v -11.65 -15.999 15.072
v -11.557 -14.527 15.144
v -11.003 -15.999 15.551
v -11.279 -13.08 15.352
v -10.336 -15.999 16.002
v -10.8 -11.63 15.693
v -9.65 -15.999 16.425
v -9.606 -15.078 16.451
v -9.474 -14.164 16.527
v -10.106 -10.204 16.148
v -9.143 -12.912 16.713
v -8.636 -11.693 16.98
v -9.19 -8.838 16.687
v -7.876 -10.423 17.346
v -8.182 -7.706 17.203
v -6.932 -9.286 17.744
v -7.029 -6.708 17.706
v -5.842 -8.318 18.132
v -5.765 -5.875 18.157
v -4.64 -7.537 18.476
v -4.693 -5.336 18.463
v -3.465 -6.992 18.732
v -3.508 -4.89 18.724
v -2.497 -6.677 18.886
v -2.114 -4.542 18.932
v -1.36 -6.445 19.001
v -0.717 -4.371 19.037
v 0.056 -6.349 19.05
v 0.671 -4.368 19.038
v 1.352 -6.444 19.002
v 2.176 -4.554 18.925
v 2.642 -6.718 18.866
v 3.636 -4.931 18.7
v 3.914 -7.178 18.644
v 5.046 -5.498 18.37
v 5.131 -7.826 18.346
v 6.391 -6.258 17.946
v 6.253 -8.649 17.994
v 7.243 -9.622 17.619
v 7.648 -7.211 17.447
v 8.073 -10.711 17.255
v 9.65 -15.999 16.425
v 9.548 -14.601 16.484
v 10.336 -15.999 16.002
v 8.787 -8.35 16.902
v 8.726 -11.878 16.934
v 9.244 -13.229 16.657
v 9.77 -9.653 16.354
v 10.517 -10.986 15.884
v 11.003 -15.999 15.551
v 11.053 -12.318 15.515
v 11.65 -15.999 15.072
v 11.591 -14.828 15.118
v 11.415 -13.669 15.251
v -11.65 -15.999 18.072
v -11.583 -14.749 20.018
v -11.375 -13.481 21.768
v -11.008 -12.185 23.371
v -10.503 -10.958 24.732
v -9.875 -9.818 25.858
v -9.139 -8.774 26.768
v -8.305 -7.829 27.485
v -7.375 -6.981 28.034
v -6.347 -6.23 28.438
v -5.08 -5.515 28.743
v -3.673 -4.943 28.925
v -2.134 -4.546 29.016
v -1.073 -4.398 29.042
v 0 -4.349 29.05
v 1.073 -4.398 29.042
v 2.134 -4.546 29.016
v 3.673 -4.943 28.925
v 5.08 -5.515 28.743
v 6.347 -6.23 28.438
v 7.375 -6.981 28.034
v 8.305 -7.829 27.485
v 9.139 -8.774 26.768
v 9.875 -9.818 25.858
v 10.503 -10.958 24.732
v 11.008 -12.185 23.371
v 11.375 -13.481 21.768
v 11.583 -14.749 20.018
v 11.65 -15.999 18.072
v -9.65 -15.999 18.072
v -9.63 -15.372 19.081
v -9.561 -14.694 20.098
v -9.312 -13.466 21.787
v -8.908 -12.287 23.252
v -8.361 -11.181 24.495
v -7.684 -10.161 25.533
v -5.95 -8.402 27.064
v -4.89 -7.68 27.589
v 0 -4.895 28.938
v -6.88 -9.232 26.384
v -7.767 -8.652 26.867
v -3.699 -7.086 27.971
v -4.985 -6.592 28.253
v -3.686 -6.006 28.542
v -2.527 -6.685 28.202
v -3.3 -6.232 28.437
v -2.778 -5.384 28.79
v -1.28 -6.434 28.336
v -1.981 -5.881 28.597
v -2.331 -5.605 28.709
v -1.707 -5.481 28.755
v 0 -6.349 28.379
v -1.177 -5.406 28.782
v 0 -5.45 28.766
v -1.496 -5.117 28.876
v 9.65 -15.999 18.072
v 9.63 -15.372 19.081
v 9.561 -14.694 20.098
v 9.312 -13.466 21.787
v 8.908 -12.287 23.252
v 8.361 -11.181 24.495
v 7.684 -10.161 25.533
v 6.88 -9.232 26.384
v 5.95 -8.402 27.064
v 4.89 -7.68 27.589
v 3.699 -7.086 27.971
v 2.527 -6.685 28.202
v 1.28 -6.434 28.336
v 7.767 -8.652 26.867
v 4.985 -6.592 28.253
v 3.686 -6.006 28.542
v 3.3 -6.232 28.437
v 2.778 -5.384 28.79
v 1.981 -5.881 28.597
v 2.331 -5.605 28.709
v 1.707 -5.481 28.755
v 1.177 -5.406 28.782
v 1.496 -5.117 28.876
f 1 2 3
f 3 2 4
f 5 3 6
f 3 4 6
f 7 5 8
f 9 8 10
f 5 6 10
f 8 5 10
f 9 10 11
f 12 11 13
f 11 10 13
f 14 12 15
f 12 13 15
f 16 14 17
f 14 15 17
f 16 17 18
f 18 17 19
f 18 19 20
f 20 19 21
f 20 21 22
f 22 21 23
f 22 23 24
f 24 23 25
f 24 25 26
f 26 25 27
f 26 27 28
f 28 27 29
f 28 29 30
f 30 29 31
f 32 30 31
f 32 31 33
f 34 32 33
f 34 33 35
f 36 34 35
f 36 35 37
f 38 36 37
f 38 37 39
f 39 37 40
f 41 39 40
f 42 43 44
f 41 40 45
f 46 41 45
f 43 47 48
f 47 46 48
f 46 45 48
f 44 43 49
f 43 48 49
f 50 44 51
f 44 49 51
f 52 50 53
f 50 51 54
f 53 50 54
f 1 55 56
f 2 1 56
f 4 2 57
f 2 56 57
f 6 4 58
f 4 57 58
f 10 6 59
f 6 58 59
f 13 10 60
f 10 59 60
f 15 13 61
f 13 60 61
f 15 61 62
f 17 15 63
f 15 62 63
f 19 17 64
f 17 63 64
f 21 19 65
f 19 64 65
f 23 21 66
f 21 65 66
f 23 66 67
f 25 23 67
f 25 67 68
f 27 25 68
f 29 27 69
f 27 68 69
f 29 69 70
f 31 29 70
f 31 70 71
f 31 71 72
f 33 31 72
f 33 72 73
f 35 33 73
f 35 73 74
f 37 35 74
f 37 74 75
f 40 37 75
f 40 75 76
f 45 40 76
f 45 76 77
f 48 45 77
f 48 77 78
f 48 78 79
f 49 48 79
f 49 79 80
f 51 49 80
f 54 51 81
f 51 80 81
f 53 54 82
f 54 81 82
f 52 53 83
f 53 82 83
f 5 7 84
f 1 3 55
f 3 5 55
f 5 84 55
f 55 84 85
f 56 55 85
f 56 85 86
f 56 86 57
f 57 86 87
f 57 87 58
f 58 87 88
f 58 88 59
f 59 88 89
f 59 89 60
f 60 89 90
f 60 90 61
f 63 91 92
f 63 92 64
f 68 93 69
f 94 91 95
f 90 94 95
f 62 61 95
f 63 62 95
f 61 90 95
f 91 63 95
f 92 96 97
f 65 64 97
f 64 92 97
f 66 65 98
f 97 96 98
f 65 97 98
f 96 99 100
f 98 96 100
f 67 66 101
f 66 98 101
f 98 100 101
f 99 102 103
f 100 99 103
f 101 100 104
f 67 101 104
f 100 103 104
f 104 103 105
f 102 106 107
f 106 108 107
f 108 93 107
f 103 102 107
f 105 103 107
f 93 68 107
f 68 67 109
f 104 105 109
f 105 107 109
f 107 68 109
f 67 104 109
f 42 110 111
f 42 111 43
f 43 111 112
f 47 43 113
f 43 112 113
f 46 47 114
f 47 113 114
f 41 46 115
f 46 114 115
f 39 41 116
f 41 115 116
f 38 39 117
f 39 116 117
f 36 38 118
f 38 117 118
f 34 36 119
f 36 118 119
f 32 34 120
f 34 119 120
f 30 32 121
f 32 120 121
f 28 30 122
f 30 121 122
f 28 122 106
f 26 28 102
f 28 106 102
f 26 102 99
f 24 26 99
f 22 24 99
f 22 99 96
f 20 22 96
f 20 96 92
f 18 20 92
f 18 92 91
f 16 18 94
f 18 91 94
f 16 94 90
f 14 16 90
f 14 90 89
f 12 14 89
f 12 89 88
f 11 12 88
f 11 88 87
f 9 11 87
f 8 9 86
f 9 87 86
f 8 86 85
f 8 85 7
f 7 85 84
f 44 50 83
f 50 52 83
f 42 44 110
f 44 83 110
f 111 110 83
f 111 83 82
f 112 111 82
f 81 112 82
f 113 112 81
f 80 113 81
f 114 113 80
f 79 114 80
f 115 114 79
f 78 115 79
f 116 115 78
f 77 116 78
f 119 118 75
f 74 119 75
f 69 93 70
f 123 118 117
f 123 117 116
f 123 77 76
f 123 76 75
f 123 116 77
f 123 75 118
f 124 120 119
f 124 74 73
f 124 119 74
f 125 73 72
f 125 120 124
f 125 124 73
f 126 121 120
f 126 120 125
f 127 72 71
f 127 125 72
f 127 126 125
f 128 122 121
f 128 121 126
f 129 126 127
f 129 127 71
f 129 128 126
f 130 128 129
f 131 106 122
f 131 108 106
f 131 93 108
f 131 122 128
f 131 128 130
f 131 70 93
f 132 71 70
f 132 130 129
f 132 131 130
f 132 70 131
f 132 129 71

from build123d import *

# Parameters (mm, degrees)
F1_DEPTH      = 25
F2_W          = 38.0999911882
F2_H          = 25
F3_DEPTH      = 29.0380437433
F5_DEPTH      = 11.6510001
F5_DEPTH_BACK = 11.6510001


with BuildPart() as f1:
    # F0 (on Front) → F1 (new body)
    with BuildSketch(Plane.XZ):
        with BuildLine():
            ThreePointArc((-19.0499955941, 0.0129562567), (0, 19.05), (19.0499955941, 0.0129562567))
            Line((19.0499955941, 0.0129562567), (19.0499955941, 29.05))
            Line((19.0499955941, 29.05), (-19.0499955941, 29.05))
            Line((-19.0499955941, 29.05), (-19.0499955941, 0.0129562567))
        make_face()
    extrude(amount=F1_DEPTH)

    # F2 (on face) → F3 (cut, through all)
    with BuildSketch(Plane.XY.offset(29.05)):
        with Locations((0, -12.5)):
            Rectangle(F2_W, F2_H)
        with BuildLine():
            ThreePointArc((-11.65, -15.9987397492), (0, -4.3487397492), (11.65, -15.9987397492))
            Line((11.65, -15.9987397492), (9.6499996489, -15.9987397492))
            ThreePointArc((9.6499996489, -15.9987397492), (0, -6.3487401003), (-9.6499996489, -15.9987397492))
            Line((-9.6499996489, -15.9987397492), (-11.65, -15.9987397492))
        make_face(mode=Mode.SUBTRACT)
    extrude(amount=-F3_DEPTH, mode=Mode.SUBTRACT)

    # F4 (on Right) → F5 (cut, two sides)
    with BuildSketch(Plane.YZ) as f5_sk:
        with BuildLine():
            Line((-15.9987397492, 29.05), (-15.9987397492, 18.0724914994))
            add(Edge.make_bspline(
                [(-15.9987397492, 18.0724914994), (-13.4661328048, 22.3090033978), (-8.5014579818, 28.4231342375), (-4.3487397492, 29.05)],
                knots=[0, 0, 0, 0, 16.0071294391, 16.0071294391, 16.0071294391, 16.0071294391], degree=3))
            Line((-4.3487397492, 29.05), (-15.9987397492, 29.05))
        make_face()
    extrude(amount=-F5_DEPTH, mode=Mode.SUBTRACT)
    extrude(f5_sk.sketch, amount=F5_DEPTH_BACK, mode=Mode.SUBTRACT)


solid = f1.part
